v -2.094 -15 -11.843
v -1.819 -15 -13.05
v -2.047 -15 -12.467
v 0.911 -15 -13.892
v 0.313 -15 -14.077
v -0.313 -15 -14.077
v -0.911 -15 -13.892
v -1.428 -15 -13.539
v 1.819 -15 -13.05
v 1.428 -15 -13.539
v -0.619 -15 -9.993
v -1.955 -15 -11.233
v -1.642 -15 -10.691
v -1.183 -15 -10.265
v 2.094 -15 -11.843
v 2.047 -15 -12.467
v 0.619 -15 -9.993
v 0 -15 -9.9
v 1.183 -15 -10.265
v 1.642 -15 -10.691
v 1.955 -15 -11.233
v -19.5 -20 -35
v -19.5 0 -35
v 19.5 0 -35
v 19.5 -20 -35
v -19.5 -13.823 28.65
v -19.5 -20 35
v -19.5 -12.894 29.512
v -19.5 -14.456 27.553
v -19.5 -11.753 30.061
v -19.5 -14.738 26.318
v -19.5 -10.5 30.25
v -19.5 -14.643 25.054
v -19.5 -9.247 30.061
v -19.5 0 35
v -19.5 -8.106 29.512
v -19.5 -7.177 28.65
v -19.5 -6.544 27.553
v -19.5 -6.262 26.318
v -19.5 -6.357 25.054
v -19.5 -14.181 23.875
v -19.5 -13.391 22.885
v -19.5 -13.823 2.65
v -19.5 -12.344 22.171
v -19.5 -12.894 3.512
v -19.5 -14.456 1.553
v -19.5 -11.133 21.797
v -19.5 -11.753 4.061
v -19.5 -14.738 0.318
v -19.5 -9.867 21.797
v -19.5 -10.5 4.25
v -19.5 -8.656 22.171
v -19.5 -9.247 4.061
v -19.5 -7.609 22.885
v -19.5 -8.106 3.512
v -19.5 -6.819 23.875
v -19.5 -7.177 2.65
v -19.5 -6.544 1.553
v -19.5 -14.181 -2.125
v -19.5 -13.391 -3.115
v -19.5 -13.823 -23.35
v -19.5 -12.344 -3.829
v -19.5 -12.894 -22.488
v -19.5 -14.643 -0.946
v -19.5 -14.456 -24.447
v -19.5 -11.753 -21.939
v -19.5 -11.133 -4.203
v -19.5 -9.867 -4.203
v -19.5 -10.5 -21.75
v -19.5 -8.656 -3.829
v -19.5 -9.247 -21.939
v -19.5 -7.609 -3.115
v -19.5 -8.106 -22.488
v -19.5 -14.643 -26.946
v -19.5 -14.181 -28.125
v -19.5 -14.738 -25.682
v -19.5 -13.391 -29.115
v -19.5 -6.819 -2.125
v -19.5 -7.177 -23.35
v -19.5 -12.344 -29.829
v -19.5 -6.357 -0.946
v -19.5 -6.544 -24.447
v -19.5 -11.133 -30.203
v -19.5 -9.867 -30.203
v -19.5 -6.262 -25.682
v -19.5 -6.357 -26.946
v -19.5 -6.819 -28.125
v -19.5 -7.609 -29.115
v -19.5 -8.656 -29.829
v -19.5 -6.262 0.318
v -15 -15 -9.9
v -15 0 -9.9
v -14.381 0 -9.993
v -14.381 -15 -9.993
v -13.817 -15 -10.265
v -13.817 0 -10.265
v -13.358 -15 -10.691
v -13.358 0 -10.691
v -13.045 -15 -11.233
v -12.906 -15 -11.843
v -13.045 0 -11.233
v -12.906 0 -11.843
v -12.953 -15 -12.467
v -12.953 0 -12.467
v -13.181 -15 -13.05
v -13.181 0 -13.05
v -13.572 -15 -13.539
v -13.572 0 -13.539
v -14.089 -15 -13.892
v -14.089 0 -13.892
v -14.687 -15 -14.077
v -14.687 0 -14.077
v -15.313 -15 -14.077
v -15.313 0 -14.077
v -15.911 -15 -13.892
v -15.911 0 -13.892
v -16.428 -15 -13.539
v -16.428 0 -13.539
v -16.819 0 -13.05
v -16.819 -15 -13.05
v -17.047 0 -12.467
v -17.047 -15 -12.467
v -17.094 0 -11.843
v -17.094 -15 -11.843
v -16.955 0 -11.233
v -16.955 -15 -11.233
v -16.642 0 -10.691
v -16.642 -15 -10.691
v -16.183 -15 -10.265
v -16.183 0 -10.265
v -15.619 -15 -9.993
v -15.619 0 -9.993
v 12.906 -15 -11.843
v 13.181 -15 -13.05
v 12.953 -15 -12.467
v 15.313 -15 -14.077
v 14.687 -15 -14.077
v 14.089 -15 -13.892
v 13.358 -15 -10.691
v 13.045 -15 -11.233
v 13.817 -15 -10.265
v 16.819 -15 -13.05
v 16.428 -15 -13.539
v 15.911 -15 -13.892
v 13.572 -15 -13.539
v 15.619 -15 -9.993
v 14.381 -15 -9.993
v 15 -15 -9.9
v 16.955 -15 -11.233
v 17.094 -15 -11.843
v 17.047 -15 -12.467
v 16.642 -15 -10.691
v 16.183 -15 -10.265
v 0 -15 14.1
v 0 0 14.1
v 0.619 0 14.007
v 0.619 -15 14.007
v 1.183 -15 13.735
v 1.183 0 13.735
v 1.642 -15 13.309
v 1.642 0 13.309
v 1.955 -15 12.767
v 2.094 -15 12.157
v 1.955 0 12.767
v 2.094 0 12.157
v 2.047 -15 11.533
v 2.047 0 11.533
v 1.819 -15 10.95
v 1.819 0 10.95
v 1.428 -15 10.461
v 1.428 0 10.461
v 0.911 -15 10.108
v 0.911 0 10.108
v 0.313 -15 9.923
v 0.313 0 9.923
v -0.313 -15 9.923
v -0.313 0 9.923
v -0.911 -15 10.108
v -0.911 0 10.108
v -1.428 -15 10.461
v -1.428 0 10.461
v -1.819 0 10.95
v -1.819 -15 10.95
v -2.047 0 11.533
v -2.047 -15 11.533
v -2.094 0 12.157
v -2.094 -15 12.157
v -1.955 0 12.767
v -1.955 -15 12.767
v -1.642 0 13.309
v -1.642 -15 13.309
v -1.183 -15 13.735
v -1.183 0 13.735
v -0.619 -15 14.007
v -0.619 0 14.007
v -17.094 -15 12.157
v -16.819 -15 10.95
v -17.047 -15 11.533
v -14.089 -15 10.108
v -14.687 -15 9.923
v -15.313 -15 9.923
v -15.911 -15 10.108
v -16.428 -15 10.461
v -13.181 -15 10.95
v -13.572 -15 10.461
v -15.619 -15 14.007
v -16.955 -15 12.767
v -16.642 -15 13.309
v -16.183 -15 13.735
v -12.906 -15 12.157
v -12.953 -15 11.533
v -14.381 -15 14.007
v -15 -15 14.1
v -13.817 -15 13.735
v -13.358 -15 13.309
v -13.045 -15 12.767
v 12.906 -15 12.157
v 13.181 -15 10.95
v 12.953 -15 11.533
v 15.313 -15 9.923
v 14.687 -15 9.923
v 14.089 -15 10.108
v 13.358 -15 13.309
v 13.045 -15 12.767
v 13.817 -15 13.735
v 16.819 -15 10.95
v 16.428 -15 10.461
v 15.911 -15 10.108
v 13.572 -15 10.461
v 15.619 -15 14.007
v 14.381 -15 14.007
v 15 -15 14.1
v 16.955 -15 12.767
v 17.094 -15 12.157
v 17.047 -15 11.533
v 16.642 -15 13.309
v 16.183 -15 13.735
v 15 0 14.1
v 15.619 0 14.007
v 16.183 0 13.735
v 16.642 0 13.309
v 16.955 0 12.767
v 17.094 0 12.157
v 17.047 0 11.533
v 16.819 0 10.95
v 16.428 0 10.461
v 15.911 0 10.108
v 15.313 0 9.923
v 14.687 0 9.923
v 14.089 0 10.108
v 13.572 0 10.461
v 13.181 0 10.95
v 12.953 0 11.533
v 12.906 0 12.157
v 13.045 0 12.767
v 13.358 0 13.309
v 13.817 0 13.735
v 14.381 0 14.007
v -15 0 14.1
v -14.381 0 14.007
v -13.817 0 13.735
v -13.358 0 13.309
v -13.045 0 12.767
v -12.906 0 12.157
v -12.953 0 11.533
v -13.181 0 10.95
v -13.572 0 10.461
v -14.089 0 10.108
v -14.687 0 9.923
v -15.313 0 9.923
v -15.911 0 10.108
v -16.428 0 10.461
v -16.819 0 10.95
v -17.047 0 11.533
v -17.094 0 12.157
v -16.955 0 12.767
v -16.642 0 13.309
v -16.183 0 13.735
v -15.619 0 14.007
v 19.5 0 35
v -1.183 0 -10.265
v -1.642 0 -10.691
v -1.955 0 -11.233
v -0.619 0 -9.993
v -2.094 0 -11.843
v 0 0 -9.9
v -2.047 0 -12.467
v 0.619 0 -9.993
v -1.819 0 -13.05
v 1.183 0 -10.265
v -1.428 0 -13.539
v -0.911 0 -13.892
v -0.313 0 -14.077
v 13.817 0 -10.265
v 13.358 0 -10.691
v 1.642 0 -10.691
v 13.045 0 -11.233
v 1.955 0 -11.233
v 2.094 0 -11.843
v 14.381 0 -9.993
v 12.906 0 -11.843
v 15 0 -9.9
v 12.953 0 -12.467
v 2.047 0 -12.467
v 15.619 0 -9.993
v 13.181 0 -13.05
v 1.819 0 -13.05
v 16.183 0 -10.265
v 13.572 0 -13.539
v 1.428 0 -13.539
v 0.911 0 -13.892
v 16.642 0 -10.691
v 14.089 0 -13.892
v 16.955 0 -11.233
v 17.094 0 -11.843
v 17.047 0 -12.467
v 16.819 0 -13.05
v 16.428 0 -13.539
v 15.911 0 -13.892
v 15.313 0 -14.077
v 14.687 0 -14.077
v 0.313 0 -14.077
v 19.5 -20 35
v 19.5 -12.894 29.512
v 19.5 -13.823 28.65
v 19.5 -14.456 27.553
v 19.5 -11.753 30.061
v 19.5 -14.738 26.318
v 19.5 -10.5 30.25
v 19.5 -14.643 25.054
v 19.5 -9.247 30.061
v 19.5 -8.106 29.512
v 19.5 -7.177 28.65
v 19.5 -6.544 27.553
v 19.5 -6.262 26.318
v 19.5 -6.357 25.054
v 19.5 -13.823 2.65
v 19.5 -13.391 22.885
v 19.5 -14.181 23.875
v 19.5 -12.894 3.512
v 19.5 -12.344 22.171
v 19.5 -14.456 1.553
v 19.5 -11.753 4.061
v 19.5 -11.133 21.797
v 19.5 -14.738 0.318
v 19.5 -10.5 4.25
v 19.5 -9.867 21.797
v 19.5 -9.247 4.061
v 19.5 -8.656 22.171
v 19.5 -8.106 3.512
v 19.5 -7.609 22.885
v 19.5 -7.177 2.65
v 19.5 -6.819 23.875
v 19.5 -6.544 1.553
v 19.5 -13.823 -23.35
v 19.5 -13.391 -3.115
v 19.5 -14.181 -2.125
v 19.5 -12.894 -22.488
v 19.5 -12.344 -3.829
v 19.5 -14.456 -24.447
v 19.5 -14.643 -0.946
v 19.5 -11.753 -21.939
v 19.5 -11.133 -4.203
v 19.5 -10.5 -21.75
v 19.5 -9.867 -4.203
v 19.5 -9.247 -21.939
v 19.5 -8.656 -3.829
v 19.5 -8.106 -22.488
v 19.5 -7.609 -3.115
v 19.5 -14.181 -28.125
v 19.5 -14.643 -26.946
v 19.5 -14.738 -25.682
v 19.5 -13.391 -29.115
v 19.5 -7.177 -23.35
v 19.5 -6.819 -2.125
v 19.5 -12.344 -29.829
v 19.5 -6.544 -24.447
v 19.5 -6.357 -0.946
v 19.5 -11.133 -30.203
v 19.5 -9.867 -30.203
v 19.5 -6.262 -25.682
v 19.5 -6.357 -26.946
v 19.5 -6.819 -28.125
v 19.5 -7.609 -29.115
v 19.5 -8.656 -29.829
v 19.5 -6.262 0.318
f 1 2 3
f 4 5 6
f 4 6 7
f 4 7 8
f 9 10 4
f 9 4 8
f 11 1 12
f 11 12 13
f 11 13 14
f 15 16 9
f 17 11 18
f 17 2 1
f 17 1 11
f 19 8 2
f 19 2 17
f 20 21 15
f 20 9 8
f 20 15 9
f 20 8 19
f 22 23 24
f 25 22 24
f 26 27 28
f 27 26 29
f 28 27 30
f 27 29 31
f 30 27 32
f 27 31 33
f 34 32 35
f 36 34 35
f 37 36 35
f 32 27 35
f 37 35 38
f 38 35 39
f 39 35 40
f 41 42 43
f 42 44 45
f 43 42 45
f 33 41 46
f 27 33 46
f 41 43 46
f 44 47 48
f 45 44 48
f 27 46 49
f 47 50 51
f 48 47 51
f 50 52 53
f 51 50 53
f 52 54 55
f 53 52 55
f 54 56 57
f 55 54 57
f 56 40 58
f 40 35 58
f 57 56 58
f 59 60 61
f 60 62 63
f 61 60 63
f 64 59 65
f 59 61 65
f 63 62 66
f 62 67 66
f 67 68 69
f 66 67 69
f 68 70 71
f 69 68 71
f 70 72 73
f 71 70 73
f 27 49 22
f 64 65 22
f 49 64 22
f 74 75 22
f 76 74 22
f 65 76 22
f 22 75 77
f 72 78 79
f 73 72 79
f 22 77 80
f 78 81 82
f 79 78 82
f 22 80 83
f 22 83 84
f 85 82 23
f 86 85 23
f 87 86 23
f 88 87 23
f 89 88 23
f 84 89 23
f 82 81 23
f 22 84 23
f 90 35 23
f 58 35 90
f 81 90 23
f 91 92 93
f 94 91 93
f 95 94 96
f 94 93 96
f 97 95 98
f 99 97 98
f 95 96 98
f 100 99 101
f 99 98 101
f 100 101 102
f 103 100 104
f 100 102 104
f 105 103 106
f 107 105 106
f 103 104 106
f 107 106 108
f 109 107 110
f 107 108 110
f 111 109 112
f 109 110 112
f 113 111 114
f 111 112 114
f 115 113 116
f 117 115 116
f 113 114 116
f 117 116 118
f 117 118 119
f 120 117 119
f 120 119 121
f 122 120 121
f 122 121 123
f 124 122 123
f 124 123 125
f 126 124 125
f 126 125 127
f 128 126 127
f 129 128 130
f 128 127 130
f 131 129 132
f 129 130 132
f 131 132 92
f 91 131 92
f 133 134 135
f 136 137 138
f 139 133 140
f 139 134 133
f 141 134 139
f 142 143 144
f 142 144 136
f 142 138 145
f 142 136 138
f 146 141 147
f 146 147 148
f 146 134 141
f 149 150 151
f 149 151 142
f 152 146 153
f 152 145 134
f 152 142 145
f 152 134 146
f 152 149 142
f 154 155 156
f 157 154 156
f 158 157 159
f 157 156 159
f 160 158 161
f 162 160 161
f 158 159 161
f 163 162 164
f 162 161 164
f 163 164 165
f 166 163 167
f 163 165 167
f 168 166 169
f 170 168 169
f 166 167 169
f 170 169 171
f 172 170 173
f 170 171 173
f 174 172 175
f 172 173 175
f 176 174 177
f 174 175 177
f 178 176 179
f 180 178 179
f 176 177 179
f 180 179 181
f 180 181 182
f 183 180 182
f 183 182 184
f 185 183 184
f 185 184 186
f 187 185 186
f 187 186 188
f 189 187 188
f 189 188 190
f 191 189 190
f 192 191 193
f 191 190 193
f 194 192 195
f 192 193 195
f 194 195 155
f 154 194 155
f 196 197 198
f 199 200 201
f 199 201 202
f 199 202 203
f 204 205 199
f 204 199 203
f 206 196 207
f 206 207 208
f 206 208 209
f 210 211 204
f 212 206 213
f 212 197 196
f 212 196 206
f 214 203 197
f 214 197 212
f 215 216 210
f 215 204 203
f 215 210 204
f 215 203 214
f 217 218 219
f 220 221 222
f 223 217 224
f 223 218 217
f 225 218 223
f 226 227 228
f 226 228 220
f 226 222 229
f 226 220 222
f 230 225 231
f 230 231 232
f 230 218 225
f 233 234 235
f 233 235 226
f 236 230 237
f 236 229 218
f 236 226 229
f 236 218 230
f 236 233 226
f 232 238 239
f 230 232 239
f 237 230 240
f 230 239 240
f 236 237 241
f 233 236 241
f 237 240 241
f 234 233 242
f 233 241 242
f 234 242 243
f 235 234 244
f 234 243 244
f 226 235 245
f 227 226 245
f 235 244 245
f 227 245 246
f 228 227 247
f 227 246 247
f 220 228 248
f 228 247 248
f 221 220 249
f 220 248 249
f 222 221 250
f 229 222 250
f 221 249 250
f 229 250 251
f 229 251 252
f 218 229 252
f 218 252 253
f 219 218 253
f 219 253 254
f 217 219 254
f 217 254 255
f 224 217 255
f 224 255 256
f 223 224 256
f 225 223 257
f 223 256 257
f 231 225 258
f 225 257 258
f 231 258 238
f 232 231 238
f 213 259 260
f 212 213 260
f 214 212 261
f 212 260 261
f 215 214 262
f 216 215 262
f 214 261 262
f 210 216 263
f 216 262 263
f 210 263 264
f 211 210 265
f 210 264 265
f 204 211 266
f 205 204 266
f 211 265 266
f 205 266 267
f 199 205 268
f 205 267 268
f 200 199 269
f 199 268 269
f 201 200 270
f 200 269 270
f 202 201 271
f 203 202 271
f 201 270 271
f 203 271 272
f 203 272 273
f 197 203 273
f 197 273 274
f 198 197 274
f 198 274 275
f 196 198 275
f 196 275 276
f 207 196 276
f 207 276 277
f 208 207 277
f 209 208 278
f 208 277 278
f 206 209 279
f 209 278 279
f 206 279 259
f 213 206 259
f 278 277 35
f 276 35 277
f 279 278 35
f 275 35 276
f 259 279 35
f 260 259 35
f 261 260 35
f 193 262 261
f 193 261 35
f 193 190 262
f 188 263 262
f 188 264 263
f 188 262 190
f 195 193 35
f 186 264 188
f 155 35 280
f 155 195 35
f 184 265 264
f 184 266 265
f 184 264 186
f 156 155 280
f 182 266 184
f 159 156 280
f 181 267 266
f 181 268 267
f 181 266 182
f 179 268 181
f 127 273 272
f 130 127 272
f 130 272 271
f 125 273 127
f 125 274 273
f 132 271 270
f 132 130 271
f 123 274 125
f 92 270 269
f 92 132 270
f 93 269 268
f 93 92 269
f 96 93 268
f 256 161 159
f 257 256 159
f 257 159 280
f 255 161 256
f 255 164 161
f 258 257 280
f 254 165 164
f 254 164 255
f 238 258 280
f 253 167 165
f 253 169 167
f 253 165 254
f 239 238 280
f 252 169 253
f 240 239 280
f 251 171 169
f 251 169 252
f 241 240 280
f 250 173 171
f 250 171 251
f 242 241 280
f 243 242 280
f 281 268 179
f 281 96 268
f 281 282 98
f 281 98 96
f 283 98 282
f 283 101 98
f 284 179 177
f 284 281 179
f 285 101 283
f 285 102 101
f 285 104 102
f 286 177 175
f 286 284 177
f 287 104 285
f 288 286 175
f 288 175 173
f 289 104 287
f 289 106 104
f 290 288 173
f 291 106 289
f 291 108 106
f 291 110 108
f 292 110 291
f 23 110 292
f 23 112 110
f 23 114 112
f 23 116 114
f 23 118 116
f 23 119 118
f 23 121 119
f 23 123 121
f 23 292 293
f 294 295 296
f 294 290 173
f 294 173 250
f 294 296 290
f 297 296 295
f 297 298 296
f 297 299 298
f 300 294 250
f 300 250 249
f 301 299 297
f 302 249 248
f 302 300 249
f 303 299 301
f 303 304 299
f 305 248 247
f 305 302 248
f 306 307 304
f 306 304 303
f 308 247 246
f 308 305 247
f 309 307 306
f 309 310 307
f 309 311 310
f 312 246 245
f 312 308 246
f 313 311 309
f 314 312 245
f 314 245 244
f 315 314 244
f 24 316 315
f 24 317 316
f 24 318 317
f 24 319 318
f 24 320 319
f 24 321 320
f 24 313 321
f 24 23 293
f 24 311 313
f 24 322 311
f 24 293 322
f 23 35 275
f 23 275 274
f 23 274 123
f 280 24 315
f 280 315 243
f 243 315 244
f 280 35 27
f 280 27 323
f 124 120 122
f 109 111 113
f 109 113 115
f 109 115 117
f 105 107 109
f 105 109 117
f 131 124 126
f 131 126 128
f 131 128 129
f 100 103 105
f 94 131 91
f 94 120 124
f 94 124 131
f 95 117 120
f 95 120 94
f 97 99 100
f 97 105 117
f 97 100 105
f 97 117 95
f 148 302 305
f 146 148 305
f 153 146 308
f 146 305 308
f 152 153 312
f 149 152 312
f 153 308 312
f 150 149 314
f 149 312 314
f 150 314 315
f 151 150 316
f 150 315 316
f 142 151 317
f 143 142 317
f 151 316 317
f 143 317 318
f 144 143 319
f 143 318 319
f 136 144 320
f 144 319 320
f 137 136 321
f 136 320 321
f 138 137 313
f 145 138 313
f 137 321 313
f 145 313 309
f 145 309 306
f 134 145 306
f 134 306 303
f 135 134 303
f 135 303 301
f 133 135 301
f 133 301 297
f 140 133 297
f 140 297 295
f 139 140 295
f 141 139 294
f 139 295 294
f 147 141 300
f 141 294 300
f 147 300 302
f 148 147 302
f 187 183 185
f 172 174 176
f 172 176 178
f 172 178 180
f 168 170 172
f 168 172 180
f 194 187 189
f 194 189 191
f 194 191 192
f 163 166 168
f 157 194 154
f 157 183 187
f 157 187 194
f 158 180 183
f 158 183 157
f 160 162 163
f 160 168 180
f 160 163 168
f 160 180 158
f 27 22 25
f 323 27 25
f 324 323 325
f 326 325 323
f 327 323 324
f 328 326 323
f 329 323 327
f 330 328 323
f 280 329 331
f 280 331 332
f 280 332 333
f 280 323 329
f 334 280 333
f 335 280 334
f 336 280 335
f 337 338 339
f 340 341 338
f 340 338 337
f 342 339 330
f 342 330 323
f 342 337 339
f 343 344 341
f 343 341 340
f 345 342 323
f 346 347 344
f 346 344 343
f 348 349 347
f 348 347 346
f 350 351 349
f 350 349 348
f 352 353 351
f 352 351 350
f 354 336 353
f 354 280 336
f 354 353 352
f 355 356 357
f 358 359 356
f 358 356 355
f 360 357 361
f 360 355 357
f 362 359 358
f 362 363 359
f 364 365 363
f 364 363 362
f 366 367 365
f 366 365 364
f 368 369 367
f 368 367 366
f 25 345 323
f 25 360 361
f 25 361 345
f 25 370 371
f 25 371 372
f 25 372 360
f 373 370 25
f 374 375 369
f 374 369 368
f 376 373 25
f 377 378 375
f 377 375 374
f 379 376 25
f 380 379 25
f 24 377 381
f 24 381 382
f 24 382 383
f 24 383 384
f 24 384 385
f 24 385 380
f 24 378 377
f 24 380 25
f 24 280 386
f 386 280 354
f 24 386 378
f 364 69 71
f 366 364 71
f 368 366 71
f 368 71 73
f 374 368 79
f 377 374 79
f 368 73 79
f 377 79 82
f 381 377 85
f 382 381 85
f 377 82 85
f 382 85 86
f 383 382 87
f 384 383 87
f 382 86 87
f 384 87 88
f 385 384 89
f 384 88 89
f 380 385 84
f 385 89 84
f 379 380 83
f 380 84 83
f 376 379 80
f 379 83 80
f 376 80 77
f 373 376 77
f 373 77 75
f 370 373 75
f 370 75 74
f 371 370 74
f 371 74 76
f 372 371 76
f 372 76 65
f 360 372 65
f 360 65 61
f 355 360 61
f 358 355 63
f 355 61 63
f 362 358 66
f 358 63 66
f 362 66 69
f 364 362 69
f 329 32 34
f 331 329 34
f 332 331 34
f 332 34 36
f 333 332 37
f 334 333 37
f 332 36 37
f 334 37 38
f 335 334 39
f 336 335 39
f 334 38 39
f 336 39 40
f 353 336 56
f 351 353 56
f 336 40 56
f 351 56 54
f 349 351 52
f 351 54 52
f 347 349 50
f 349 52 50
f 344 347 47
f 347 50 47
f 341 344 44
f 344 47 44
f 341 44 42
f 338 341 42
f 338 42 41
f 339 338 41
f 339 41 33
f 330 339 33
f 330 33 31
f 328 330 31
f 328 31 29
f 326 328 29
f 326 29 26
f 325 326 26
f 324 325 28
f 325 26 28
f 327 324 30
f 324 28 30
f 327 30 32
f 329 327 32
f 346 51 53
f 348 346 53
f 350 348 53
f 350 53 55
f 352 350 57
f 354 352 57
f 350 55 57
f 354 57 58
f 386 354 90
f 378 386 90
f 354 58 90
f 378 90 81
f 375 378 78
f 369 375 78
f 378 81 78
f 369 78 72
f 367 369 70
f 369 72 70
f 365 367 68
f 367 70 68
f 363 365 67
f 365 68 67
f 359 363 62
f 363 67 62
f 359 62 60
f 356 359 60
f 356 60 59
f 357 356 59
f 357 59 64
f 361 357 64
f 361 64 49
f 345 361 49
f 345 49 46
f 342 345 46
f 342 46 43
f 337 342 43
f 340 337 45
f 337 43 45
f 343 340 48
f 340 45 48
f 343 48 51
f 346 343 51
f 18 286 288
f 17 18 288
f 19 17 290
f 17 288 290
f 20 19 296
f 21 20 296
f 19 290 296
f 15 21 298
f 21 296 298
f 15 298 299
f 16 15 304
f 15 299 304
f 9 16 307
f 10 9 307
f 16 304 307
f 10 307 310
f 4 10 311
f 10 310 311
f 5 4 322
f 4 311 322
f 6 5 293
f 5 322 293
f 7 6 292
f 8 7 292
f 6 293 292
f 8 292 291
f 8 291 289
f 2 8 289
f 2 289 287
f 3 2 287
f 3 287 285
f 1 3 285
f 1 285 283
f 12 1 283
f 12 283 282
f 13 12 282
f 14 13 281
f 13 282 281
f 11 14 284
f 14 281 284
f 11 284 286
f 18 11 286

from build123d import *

# Parameters (mm, degrees)
ESBO_O1_W             = 39
ESBO_O1_H             = 70
FLANGE_BASE1_DEPTH    = 20
ESBO_O6_R             = 2.1
CORTE_EXTRUS_O1_DEPTH = 15
ESBO_O8_R             = 4.25
CORTE_EXTRUS_O2_DEPTH = 39


# Sheet-metal steps are written as plain solids
with BuildPart() as part:
    # Esboço1 → Flange-base1 (new body)
    with BuildSketch(Plane(origin=(0, 0, 0), x_dir=(1, 0, 0), z_dir=(0, 1, 0))):
        Rectangle(ESBO_O1_W, ESBO_O1_H)
    extrude(amount=-FLANGE_BASE1_DEPTH)

    # Esboço6 → Corte-extrusão1 (cut)
    with BuildSketch(Plane(origin=(0, 0, 0), x_dir=(1, 0, 0), z_dir=(0, 1, 0))):
        with Locations(Location((-15, 12, 0), (0, 0, 270))):
            Circle(ESBO_O6_R)
        with Locations(Location((15, 12, 0), (0, 0, 270))):
            Circle(ESBO_O6_R)
        with Locations(Location((0, 12, 0), (0, 0, 270))):
            Circle(ESBO_O6_R)
        with Locations(Location((-15, -12, 0), (0, 0, 270))):
            Circle(ESBO_O6_R)
        with Locations(Location((0, -12, 0), (0, 0, 270))):
            Circle(ESBO_O6_R)
        with Locations(Location((15, -12, 0), (0, 0, 270))):
            Circle(ESBO_O6_R)
    extrude(amount=-CORTE_EXTRUS_O1_DEPTH, mode=Mode.SUBTRACT)

    # Esboço8 → Corte-extrusão2 (cut)
    with BuildSketch(Plane.ZY.offset(19.5)):
        with Locations((-26, -10.5)):
            Circle(ESBO_O8_R)
        with Locations((26, -10.5)):
            Circle(ESBO_O8_R)
        with Locations((0, -10.5)):
            Circle(ESBO_O8_R)
    extrude(amount=-CORTE_EXTRUS_O2_DEPTH, mode=Mode.SUBTRACT)


solid = part.part
